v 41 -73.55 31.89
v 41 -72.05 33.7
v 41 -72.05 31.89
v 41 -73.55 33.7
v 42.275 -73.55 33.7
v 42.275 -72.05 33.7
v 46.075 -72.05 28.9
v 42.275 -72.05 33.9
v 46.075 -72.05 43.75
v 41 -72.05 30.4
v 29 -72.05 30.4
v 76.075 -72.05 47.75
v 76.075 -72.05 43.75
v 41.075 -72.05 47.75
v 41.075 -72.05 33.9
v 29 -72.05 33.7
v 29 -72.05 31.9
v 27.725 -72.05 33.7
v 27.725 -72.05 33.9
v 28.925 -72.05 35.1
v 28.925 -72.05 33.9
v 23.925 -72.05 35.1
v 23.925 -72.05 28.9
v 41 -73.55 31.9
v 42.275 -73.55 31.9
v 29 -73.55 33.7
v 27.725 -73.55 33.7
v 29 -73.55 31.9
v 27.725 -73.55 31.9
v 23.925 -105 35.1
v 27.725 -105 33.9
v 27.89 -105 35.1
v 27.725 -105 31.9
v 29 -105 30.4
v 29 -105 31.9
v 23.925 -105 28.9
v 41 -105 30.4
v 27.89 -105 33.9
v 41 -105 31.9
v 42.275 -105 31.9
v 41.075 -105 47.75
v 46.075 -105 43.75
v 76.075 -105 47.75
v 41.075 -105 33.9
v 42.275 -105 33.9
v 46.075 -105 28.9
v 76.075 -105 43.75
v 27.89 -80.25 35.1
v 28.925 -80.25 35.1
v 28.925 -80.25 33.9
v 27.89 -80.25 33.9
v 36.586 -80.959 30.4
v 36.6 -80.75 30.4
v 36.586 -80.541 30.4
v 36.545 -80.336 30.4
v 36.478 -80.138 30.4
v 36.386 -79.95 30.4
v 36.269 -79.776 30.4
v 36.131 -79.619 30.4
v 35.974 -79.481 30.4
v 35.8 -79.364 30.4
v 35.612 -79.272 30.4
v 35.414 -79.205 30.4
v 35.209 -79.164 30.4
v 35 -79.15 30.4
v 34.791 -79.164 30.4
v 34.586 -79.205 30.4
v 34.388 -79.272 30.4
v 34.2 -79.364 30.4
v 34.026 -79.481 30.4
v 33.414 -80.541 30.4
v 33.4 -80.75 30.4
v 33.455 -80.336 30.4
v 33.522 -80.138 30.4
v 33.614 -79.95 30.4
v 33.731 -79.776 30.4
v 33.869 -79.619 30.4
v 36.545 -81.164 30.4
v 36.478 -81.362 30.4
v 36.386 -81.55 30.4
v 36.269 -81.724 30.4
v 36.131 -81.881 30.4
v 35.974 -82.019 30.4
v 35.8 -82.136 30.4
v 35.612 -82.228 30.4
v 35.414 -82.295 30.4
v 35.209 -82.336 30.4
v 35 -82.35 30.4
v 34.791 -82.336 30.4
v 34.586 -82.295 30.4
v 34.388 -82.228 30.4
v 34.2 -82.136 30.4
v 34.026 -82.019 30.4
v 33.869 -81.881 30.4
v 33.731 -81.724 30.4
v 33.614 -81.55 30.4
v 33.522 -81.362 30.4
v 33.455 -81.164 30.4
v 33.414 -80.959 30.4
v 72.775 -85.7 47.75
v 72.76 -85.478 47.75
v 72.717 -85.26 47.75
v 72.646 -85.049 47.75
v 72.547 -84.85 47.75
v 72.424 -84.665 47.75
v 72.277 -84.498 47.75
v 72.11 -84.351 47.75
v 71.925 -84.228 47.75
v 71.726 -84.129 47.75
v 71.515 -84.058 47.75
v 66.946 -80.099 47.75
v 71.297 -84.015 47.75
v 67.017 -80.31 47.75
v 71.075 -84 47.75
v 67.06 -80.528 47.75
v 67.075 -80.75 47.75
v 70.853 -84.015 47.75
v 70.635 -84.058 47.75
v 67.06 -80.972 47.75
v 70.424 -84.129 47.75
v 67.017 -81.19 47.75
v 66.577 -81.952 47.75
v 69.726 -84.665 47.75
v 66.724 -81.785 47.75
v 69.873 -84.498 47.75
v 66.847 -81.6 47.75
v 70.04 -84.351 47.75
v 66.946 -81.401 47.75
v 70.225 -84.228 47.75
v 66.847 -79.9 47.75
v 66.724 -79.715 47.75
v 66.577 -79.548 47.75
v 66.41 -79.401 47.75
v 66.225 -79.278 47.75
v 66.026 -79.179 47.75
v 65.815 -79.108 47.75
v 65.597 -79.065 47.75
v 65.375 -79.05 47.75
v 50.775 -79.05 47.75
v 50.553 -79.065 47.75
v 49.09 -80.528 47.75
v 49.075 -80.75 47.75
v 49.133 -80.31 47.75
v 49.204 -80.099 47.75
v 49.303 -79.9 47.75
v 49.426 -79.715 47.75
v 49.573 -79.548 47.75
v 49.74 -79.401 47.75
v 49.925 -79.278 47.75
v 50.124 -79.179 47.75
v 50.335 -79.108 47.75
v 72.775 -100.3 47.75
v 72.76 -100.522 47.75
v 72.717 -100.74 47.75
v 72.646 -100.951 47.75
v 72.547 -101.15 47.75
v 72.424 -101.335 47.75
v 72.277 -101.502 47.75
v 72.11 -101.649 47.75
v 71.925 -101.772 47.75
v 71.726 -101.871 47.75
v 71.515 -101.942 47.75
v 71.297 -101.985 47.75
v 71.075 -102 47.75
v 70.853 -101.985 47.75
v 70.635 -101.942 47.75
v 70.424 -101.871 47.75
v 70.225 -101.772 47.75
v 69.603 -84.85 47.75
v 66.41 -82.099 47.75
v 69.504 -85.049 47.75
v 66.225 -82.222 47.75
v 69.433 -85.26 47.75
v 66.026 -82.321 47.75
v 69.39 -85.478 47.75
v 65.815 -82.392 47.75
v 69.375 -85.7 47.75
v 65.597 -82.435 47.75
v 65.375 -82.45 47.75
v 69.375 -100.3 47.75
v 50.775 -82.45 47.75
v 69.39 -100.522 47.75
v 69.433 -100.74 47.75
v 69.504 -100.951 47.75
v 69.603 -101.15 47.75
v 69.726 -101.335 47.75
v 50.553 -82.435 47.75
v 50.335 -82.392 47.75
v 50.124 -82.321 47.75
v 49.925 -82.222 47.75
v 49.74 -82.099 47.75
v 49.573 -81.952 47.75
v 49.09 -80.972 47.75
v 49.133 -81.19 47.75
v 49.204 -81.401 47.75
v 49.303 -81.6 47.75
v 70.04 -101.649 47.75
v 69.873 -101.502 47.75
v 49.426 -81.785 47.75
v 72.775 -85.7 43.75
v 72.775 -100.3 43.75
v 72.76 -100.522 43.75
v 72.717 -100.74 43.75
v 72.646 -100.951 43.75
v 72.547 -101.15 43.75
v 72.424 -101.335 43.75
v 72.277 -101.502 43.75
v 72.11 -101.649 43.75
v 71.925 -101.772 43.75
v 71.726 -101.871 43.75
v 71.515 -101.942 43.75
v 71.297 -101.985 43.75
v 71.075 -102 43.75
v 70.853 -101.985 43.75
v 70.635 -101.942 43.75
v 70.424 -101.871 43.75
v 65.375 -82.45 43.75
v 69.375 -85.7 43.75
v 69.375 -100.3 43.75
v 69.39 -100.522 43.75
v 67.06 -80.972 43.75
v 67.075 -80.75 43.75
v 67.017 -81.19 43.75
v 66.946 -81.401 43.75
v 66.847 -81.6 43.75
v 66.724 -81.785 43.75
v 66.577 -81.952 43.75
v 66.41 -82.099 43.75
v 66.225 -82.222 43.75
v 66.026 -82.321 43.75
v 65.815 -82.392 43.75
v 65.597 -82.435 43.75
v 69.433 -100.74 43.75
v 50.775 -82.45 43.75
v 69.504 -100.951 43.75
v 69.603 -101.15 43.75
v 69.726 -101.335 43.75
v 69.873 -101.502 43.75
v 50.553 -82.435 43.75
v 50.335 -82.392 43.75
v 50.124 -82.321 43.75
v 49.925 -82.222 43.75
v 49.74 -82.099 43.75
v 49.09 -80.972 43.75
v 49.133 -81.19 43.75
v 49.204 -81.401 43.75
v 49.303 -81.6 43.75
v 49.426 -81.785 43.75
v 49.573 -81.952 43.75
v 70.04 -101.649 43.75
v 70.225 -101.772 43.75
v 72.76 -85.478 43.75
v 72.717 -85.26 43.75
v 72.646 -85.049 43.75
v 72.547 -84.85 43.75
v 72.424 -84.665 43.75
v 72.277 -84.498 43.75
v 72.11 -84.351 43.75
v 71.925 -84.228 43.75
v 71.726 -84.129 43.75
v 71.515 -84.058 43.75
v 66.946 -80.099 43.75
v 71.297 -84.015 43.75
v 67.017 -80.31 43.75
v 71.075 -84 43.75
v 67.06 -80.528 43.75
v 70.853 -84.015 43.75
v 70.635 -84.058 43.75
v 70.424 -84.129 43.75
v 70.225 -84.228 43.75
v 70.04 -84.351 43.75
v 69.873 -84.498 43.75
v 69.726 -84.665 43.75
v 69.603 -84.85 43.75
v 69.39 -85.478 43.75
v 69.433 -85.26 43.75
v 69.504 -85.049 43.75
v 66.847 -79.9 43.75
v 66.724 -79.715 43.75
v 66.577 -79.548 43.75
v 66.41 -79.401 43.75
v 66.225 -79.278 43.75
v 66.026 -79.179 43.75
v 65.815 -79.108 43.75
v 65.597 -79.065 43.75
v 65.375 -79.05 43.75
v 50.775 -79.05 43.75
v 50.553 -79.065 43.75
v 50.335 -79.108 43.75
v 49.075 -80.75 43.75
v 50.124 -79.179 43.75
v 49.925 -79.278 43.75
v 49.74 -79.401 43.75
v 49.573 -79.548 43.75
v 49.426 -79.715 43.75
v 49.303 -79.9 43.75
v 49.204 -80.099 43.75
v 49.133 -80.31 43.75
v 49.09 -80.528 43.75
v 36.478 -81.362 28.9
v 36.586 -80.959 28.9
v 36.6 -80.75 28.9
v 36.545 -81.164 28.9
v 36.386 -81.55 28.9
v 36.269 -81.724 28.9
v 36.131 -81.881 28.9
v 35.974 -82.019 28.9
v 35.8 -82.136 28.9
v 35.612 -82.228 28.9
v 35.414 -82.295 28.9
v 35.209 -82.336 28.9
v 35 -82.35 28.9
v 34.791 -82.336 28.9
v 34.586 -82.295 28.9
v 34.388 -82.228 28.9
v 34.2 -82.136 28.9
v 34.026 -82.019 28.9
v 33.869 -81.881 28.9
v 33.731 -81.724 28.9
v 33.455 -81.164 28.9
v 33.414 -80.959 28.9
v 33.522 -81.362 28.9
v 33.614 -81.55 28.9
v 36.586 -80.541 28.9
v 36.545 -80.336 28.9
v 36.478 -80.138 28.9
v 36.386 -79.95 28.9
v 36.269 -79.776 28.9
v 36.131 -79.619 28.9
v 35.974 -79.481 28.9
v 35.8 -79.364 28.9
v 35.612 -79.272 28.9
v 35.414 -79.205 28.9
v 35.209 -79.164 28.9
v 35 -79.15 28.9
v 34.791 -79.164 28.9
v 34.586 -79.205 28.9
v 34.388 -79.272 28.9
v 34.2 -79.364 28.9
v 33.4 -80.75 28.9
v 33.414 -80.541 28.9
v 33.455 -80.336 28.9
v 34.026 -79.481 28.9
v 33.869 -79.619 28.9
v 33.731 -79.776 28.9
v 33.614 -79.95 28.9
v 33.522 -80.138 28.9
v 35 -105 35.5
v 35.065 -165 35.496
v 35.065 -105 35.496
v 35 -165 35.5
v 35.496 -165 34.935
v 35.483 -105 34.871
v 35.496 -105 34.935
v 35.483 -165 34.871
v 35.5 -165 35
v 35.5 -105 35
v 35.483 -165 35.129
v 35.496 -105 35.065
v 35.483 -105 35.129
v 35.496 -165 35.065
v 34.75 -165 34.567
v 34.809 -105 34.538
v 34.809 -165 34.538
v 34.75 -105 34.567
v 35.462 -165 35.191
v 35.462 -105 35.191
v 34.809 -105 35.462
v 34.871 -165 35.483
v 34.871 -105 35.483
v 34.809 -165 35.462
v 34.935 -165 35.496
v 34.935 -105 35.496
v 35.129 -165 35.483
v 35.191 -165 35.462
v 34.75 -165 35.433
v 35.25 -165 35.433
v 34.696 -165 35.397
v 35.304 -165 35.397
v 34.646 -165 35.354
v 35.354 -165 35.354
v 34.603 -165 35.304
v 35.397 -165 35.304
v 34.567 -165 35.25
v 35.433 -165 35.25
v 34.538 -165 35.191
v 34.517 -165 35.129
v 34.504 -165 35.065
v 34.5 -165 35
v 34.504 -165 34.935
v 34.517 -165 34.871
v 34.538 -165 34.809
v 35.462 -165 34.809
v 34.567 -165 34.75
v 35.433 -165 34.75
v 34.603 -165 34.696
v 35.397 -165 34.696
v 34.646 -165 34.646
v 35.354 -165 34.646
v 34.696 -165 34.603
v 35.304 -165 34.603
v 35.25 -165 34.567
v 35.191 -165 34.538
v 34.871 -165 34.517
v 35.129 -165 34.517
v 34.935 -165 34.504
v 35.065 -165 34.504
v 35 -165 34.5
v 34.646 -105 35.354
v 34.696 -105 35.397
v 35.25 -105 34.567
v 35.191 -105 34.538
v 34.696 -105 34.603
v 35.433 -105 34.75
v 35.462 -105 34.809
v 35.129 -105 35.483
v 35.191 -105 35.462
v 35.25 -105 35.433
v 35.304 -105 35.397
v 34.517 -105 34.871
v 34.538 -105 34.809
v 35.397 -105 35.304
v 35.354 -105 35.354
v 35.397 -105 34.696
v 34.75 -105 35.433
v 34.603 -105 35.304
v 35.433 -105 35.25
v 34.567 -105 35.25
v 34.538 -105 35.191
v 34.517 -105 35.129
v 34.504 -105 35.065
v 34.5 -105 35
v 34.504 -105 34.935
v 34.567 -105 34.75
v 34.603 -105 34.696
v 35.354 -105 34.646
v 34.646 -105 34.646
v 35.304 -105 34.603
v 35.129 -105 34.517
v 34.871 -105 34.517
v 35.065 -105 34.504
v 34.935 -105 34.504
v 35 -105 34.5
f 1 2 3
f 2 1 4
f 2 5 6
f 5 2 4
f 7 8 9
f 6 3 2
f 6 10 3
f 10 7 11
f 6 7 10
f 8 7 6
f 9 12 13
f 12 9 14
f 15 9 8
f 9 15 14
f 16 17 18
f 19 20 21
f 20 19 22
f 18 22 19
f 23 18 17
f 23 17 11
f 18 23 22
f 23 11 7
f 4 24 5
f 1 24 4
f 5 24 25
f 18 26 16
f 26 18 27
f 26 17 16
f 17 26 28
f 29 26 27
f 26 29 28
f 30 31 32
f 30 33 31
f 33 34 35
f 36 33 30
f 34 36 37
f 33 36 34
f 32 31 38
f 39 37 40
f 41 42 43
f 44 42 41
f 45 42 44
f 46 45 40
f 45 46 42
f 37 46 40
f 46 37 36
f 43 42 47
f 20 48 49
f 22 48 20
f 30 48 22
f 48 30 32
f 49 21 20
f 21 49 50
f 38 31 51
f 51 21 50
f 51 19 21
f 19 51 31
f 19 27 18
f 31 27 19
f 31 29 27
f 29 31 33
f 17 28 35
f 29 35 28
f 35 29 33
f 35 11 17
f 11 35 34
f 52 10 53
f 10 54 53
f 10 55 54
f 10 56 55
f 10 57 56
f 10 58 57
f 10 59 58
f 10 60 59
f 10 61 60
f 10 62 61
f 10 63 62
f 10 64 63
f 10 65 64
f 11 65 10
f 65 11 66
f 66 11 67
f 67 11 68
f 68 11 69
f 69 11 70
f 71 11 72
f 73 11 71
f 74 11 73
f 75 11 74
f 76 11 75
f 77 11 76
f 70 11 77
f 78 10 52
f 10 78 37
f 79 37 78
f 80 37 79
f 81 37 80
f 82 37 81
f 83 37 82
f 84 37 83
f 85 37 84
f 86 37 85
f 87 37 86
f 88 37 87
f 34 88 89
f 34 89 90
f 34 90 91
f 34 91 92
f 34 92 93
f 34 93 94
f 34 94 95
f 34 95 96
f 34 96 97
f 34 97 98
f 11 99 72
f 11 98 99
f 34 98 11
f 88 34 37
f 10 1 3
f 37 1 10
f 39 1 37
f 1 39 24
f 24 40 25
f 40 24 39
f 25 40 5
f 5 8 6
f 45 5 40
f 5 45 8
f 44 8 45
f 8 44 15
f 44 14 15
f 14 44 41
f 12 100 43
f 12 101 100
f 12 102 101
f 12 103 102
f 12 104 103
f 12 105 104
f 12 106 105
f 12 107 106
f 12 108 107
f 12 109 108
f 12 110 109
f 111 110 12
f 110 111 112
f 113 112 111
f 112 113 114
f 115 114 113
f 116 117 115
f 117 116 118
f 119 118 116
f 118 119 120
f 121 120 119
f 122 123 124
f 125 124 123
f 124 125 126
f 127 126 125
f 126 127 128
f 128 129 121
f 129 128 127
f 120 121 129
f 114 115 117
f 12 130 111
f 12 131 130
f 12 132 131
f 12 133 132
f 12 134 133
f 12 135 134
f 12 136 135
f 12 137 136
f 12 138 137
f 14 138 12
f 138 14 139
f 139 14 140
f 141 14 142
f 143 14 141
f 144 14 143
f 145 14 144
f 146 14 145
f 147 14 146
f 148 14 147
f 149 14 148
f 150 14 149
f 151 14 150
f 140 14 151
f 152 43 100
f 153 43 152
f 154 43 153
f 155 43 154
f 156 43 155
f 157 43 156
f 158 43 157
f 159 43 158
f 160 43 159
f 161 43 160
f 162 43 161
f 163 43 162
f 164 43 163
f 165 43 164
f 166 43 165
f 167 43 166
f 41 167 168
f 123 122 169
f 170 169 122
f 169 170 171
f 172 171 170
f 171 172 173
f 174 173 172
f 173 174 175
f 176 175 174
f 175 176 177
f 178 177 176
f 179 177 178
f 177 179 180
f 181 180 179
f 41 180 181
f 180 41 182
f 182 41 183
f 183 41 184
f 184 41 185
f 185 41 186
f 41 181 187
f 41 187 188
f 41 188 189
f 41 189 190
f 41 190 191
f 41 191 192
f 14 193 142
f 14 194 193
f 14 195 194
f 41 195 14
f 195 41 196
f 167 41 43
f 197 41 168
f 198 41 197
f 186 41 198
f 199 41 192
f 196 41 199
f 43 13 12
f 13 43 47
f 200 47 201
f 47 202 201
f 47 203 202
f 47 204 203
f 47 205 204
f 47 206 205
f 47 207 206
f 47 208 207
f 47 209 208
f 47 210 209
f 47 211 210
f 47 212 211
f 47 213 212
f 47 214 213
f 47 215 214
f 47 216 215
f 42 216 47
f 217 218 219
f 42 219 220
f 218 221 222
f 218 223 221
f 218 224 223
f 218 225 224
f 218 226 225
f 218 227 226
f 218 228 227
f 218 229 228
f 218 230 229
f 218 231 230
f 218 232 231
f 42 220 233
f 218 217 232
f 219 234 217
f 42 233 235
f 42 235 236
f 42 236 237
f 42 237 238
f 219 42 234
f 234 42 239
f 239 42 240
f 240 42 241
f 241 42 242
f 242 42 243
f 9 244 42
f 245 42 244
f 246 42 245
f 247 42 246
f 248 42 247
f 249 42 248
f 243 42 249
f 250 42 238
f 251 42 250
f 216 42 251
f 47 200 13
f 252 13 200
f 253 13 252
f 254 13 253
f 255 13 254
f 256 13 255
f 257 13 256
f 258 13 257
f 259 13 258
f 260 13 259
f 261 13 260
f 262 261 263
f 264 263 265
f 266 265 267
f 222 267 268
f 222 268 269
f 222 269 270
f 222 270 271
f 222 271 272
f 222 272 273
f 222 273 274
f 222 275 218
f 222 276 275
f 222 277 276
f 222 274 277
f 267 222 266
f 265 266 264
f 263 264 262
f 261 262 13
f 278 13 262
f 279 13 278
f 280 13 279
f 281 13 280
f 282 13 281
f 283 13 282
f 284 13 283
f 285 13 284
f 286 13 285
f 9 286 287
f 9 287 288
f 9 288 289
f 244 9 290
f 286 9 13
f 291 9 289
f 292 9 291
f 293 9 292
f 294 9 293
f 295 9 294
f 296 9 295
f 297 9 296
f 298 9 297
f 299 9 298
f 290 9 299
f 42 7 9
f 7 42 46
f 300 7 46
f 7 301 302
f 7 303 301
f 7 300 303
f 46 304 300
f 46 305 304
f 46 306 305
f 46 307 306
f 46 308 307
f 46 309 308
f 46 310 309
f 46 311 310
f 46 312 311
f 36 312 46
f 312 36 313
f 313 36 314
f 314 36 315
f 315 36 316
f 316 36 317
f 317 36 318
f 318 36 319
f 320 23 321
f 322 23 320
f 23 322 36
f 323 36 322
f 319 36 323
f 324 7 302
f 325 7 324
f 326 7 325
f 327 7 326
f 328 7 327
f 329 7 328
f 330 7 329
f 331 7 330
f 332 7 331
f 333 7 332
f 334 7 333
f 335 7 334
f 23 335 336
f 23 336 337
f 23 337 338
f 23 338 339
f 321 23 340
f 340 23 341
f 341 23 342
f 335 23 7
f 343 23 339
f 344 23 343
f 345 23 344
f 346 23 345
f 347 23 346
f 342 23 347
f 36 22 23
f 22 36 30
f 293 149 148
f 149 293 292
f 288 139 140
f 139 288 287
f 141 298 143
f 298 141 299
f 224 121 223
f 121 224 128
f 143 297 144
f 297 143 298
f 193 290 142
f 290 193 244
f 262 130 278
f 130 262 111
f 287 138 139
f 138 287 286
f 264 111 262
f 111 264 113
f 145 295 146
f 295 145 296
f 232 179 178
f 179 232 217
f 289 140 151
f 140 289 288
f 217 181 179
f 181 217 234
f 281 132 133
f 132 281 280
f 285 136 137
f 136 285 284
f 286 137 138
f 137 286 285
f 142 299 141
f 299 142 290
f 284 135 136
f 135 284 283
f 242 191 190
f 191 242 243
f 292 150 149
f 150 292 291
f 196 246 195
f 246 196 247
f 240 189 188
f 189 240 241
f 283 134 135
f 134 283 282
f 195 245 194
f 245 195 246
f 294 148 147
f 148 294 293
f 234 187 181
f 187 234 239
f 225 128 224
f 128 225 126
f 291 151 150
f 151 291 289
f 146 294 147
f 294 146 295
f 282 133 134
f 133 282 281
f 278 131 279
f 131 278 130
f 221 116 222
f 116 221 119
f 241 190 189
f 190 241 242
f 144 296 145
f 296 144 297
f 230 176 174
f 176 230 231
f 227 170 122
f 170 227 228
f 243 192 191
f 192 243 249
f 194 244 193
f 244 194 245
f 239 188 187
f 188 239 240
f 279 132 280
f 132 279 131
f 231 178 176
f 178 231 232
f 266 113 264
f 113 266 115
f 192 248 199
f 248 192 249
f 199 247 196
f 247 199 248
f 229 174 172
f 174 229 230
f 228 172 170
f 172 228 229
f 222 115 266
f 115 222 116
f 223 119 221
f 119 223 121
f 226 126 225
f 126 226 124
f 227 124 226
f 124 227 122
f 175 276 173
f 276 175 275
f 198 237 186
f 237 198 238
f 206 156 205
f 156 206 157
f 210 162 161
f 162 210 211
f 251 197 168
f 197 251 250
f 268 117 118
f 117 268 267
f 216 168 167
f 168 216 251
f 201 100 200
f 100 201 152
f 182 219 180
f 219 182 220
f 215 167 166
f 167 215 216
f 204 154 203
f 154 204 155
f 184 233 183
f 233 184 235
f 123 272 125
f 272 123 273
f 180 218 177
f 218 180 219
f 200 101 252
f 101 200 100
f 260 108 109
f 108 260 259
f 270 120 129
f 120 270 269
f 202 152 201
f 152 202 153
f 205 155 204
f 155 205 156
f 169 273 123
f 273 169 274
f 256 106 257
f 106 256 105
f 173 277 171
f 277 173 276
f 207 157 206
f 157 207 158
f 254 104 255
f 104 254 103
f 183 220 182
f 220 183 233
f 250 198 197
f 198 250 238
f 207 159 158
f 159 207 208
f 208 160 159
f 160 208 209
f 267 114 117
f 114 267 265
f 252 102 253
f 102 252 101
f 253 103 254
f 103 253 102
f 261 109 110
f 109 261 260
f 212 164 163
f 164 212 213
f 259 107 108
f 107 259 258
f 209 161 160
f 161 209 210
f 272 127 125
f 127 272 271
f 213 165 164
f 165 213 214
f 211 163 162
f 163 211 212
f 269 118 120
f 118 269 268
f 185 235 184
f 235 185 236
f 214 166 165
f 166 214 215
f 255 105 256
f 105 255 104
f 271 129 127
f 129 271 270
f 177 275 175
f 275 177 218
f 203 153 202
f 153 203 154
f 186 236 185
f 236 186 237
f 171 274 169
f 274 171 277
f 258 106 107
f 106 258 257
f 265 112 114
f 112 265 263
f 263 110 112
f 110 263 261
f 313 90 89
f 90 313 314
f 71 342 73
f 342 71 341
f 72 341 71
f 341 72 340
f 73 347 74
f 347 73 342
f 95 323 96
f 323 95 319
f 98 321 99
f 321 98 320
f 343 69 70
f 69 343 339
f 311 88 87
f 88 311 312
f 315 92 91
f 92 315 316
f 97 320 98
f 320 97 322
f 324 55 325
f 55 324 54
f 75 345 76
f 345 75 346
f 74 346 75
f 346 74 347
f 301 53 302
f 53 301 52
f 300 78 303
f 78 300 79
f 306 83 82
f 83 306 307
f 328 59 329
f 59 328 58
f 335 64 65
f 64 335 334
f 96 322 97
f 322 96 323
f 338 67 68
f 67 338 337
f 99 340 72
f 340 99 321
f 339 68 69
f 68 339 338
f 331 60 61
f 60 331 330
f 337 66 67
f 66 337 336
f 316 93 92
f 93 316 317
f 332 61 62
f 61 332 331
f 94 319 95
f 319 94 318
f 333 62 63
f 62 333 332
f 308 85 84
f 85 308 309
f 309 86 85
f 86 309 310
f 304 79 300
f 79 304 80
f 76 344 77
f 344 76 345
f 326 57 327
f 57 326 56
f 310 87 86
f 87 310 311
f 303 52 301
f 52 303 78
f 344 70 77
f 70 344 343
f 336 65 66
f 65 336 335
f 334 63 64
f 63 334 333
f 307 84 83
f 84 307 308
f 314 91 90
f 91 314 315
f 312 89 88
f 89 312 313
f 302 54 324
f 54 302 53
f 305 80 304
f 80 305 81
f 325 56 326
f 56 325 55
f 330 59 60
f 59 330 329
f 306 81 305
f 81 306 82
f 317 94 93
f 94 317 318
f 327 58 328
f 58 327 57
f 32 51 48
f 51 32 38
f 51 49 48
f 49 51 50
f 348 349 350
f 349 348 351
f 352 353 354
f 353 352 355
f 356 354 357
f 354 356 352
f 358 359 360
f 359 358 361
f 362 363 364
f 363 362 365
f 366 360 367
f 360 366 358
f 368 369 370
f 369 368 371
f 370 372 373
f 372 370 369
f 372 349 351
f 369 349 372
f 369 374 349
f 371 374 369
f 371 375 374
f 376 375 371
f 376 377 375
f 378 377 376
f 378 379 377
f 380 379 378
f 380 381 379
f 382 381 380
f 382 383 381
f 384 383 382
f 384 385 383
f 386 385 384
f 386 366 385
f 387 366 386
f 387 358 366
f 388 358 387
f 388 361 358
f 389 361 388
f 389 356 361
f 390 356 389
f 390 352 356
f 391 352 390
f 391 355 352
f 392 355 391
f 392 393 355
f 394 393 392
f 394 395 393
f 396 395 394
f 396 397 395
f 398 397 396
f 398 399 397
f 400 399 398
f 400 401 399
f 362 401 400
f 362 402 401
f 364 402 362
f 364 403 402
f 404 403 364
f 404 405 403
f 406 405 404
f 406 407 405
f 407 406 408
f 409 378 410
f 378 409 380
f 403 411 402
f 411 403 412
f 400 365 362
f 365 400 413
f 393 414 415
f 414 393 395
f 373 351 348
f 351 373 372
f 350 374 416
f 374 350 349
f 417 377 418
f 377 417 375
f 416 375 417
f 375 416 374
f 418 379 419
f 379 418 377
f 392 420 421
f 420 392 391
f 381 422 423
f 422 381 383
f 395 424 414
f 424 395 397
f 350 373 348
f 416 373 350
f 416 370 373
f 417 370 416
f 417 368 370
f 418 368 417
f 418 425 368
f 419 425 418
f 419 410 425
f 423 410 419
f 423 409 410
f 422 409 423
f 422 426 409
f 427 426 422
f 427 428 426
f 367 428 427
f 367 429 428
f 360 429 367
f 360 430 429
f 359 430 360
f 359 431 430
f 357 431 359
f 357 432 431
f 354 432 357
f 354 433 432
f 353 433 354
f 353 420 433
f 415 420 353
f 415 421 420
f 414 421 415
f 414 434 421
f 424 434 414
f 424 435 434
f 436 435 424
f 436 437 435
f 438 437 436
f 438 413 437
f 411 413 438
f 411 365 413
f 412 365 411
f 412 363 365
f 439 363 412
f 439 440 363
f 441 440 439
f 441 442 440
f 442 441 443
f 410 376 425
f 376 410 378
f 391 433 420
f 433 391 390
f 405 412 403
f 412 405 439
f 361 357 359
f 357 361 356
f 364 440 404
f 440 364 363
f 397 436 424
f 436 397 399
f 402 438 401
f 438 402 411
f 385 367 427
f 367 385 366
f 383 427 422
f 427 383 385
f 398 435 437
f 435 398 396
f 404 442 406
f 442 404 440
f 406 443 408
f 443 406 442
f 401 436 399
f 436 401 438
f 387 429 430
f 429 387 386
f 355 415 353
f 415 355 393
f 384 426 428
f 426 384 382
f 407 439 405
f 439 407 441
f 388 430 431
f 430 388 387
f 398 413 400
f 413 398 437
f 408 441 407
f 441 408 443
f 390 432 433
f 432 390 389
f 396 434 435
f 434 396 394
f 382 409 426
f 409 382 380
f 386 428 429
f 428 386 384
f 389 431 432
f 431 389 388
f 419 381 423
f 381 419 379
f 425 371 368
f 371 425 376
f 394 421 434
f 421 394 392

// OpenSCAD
// BLOC-BOT: rear mount for the MH-Sensor-Series "Flying Fish" IR obstacle module.
// Test part (BlocBot-Sim). Units: mm.
//
// Robot frame: x right, y forward, z up, floor at z = 0. Plate rear edge at y = -105.
// The board lies flat, long side along y, IR LED end pointing backwards (-y).
// The whole part is one profile in the XZ plane extruded along y, so it prints on its
// side with no supports.
//
//   export = true  -> print-oriented solid only (for the STL)
//   export = false -> mount in place on the robot, with ghost plate, caster and board

export = false;

// ---- robot (from the BLOC-BOT repo README)
plate_under_z = 47.75;   // plate underside above the floor
plate_rear_y  = -105;    // rear edge of the 210 x 210 plate
caster_y      = -80;     // rear caster, centred on x = 0

// ---- board (from the GrabCAD model "Sensor, IR, Arduino Type, Flying Fish MH-B",
//      BLOC-BOT/CAD/sensor-ir-arduino-type-flying-fish-mh-b-1.snapshot.3.zip)
pcb_l = 31.25;           // LED end to header end
pcb_w = 14.15;
pcb_t = 1.6;
led_axis_above = 1.3;    // LED centre above the PCB top
led_gap = 1.5;           // LED flange starts this far past the PCB edge
led_protrude = 10.2;     // LED tips past the PCB edge
led_pitch = 8;           // LED centres are +-4 from the board centre line
pin_below = 1.0;         // LED leads and header pins poke this far through the PCB bottom
pin_span = 11.2;         // width of the band those pin tips sit in (+-5.6 from centre)
hole_y = 24.25;          // board hole centre from the LED end (7 from the header end)
hole_d = 3.2;            // board hole is 3.0; 3.2 here = M3 clearance

// ---- placement
sensor_h = 35;           // LED centre line above the floor
x_offset = 35;           // board centre to the side of the caster (+x = right)
led_overhang = 0;        // PCB LED edge past the plate rear edge (+ = further out)

// ---- part
wall = 4;                // drop wall / near rail width
rail = 4;                // far rail width
shelf_t = 3;             // shelf under the board
channel_w = 12;          // relief channel in the shelf for the pin tips
channel_d = 1.5;         // its depth (pin tips stick out 1.0)
stop_l = 1.5;            // end stop at the header end; the board slides in from the LED end
lip = 1;                 // how far the rails overlap the board edges
lip_t = 1.2;             // lip thickness above the board
clr = 0.2;               // clearance each side of the board in the grooves
flange_t = 4;
flange_w = 30;           // flange reach sideways, away from the board
slot_w = 3.4;            // M3 slots
$fn = 48;

// ---- derived (local frame: plate underside z = 0, board x 0..pcb_w, LED end y = 0)
drop   = plate_under_z - sensor_h;          // 12.75 with the defaults
pcb_top = -drop - led_axis_above;
pcb_bot = pcb_top - pcb_t;
lip_top = pcb_top + clr + lip_t;
shelf_bot = pcb_bot - clr - shelf_t;
x_near = -wall;                              // outer face of the drop wall
x_far  = pcb_w + rail;
fx0 = x_near - flange_w;                     // flange outer edge
body_l = pcb_l + clr + stop_l;               // length of the part along y

module profile() {
    difference() {
        union() {
            translate([fx0, -flange_t]) square([flange_w + wall + lip, flange_t]);    // flange
            translate([x_near, shelf_bot]) square([wall + lip, -shelf_bot]);         // drop wall
            translate([x_near, shelf_bot]) square([x_far - x_near, shelf_t]);         // shelf
            translate([pcb_w - lip, shelf_bot]) square([rail + lip, lip_top - shelf_bot]); // far rail
        }
        translate([-clr, pcb_bot - clr]) square([pcb_w + 2 * clr, pcb_t + 2 * clr]); // board groove
        translate([lip, pcb_top]) square([pcb_w - 2 * lip, 50]);                      // room above the board
        translate([(pcb_w - channel_w) / 2, pcb_bot - clr - channel_d])
            square([channel_w, channel_d + 0.01]);                                  // pin-tip channel
    }
}

module slot(c, len, along_x) {
    hl = (len - slot_w) / 2;
    hull() for (s = [-1, 1])
        translate(along_x ? [c[0] + s * hl, c[1], 0] : [c[0], c[1] + s * hl, 0])
            cylinder(d = slot_w, h = 50, center = true);
}

module mount_local() {
    difference() {
        union() {
            rotate([90, 0, 0]) mirror([0, 0, 1]) linear_extrude(body_l) profile();  // extrude along +y
            // end stop: fills the groove on both edge strips, clear of the pin-tip channel
            for (x0 = [-clr, (pcb_w + channel_w) / 2])
                translate([x0, pcb_l + clr, pcb_bot - clr - 0.01]) cube([(pcb_w - channel_w) / 2 + clr, stop_l, pcb_t + clr + 0.01]);
        }
        slot([x_near - 12, pcb_l - 7], 18, true);       // slot along x
        slot([fx0 + 5, 12], 18, false);                 // slot along y
        translate([pcb_w / 2, hole_y, shelf_bot]) cylinder(d = hole_d, h = 10, center = true);
        // the far lip is cut away from the LED end up to past the pot, so the pot can slide in
        translate([pcb_w / 2 - 0.9, -1, pcb_top]) cube([8.01, 24.25 + 0.5 + 1, 10]);
    }
}

module dummy_board() {
    translate([0, 0, pcb_bot]) {
        c = pcb_w / 2;
        color("royalblue") difference() {
            cube([pcb_w, pcb_l, pcb_t]);
            translate([c, hole_y, -1]) cylinder(d = 3, h = 5);
        }
        for (s = [-1, 1]) {                                                // IR LED + receiver
            color(s < 0 ? "white" : "black") translate([c + s * led_pitch / 2, 0, pcb_t + led_axis_above]) rotate([90, 0, 0]) {
                translate([0, 0, led_gap]) cylinder(d = 5.8, h = 1.1);
                translate([0, 0, led_gap]) cylinder(d = 4.9, h = led_protrude - led_gap - 2.45);
                translate([0, 0, led_protrude - 2.45]) sphere(d = 4.9);
            }
            for (o = [2.73, 5.27])                                         // LED leads through the board
                color("silver") translate([c + s * o - 0.3, -led_gap, -pin_below]) cube([0.6, led_gap + 2.87, pin_below + pcb_t + led_axis_above]);
        }
        color("dodgerblue") translate([c - 0.4 + 0.0, 11.92, pcb_t]) cube([7.0, 12.33, 4.91]); // pot
        color("black") translate([c - 3.62, 24.25, pcb_t]) cube([7.25, 6.65, 1.9]);          // header body
        for (i = [-1, 0, 1]) color("gold") {                                                 // right-angle pins
            translate([c + i * 2.54 - 0.33, 29.32, -pin_below]) cube([0.66, 0.66, pin_below + pcb_t + 5.03]);
            translate([c + i * 2.54 - 0.33, 29.32, pcb_t + 4.37]) cube([0.66, 7.14, 0.66]);
        }
    }
}

// local -> robot: board centre at x_offset, flange towards +x (away from the caster),
// LED end at the plate rear edge, plate underside at plate_under_z
module place() {
    translate([x_offset + pcb_w / 2, plate_rear_y - led_overhang, plate_under_z])
        mirror([1, 0, 0]) children();
}

if (export) {
    // stand the extrusion on its header-end face: the profile is flat on the bed
    rotate([-90, 0, 0]) translate([0, -body_l, 0]) mount_local();
} else {
    place() { color("orange") mount_local(); %dummy_board(); }
    %translate([-105, plate_rear_y, plate_under_z]) cube([210, 60, 10]);          // plate (rear strip)
    %translate([0, caster_y, 0]) cylinder(r = 15, h = plate_under_z);             // caster envelope
    color("red", 0.4) translate([x_offset, plate_rear_y - 60, sensor_h]) rotate([-90, 0, 0]) cylinder(d = 1, h = 60); // beam axis
}

echo(str("drop below plate = ", drop, " mm; shelf bottom above floor = ", plate_under_z + shelf_bot,
         " mm; nearest part to caster centre x = ", x_offset + pcb_w / 2 - x_far, " mm"));
